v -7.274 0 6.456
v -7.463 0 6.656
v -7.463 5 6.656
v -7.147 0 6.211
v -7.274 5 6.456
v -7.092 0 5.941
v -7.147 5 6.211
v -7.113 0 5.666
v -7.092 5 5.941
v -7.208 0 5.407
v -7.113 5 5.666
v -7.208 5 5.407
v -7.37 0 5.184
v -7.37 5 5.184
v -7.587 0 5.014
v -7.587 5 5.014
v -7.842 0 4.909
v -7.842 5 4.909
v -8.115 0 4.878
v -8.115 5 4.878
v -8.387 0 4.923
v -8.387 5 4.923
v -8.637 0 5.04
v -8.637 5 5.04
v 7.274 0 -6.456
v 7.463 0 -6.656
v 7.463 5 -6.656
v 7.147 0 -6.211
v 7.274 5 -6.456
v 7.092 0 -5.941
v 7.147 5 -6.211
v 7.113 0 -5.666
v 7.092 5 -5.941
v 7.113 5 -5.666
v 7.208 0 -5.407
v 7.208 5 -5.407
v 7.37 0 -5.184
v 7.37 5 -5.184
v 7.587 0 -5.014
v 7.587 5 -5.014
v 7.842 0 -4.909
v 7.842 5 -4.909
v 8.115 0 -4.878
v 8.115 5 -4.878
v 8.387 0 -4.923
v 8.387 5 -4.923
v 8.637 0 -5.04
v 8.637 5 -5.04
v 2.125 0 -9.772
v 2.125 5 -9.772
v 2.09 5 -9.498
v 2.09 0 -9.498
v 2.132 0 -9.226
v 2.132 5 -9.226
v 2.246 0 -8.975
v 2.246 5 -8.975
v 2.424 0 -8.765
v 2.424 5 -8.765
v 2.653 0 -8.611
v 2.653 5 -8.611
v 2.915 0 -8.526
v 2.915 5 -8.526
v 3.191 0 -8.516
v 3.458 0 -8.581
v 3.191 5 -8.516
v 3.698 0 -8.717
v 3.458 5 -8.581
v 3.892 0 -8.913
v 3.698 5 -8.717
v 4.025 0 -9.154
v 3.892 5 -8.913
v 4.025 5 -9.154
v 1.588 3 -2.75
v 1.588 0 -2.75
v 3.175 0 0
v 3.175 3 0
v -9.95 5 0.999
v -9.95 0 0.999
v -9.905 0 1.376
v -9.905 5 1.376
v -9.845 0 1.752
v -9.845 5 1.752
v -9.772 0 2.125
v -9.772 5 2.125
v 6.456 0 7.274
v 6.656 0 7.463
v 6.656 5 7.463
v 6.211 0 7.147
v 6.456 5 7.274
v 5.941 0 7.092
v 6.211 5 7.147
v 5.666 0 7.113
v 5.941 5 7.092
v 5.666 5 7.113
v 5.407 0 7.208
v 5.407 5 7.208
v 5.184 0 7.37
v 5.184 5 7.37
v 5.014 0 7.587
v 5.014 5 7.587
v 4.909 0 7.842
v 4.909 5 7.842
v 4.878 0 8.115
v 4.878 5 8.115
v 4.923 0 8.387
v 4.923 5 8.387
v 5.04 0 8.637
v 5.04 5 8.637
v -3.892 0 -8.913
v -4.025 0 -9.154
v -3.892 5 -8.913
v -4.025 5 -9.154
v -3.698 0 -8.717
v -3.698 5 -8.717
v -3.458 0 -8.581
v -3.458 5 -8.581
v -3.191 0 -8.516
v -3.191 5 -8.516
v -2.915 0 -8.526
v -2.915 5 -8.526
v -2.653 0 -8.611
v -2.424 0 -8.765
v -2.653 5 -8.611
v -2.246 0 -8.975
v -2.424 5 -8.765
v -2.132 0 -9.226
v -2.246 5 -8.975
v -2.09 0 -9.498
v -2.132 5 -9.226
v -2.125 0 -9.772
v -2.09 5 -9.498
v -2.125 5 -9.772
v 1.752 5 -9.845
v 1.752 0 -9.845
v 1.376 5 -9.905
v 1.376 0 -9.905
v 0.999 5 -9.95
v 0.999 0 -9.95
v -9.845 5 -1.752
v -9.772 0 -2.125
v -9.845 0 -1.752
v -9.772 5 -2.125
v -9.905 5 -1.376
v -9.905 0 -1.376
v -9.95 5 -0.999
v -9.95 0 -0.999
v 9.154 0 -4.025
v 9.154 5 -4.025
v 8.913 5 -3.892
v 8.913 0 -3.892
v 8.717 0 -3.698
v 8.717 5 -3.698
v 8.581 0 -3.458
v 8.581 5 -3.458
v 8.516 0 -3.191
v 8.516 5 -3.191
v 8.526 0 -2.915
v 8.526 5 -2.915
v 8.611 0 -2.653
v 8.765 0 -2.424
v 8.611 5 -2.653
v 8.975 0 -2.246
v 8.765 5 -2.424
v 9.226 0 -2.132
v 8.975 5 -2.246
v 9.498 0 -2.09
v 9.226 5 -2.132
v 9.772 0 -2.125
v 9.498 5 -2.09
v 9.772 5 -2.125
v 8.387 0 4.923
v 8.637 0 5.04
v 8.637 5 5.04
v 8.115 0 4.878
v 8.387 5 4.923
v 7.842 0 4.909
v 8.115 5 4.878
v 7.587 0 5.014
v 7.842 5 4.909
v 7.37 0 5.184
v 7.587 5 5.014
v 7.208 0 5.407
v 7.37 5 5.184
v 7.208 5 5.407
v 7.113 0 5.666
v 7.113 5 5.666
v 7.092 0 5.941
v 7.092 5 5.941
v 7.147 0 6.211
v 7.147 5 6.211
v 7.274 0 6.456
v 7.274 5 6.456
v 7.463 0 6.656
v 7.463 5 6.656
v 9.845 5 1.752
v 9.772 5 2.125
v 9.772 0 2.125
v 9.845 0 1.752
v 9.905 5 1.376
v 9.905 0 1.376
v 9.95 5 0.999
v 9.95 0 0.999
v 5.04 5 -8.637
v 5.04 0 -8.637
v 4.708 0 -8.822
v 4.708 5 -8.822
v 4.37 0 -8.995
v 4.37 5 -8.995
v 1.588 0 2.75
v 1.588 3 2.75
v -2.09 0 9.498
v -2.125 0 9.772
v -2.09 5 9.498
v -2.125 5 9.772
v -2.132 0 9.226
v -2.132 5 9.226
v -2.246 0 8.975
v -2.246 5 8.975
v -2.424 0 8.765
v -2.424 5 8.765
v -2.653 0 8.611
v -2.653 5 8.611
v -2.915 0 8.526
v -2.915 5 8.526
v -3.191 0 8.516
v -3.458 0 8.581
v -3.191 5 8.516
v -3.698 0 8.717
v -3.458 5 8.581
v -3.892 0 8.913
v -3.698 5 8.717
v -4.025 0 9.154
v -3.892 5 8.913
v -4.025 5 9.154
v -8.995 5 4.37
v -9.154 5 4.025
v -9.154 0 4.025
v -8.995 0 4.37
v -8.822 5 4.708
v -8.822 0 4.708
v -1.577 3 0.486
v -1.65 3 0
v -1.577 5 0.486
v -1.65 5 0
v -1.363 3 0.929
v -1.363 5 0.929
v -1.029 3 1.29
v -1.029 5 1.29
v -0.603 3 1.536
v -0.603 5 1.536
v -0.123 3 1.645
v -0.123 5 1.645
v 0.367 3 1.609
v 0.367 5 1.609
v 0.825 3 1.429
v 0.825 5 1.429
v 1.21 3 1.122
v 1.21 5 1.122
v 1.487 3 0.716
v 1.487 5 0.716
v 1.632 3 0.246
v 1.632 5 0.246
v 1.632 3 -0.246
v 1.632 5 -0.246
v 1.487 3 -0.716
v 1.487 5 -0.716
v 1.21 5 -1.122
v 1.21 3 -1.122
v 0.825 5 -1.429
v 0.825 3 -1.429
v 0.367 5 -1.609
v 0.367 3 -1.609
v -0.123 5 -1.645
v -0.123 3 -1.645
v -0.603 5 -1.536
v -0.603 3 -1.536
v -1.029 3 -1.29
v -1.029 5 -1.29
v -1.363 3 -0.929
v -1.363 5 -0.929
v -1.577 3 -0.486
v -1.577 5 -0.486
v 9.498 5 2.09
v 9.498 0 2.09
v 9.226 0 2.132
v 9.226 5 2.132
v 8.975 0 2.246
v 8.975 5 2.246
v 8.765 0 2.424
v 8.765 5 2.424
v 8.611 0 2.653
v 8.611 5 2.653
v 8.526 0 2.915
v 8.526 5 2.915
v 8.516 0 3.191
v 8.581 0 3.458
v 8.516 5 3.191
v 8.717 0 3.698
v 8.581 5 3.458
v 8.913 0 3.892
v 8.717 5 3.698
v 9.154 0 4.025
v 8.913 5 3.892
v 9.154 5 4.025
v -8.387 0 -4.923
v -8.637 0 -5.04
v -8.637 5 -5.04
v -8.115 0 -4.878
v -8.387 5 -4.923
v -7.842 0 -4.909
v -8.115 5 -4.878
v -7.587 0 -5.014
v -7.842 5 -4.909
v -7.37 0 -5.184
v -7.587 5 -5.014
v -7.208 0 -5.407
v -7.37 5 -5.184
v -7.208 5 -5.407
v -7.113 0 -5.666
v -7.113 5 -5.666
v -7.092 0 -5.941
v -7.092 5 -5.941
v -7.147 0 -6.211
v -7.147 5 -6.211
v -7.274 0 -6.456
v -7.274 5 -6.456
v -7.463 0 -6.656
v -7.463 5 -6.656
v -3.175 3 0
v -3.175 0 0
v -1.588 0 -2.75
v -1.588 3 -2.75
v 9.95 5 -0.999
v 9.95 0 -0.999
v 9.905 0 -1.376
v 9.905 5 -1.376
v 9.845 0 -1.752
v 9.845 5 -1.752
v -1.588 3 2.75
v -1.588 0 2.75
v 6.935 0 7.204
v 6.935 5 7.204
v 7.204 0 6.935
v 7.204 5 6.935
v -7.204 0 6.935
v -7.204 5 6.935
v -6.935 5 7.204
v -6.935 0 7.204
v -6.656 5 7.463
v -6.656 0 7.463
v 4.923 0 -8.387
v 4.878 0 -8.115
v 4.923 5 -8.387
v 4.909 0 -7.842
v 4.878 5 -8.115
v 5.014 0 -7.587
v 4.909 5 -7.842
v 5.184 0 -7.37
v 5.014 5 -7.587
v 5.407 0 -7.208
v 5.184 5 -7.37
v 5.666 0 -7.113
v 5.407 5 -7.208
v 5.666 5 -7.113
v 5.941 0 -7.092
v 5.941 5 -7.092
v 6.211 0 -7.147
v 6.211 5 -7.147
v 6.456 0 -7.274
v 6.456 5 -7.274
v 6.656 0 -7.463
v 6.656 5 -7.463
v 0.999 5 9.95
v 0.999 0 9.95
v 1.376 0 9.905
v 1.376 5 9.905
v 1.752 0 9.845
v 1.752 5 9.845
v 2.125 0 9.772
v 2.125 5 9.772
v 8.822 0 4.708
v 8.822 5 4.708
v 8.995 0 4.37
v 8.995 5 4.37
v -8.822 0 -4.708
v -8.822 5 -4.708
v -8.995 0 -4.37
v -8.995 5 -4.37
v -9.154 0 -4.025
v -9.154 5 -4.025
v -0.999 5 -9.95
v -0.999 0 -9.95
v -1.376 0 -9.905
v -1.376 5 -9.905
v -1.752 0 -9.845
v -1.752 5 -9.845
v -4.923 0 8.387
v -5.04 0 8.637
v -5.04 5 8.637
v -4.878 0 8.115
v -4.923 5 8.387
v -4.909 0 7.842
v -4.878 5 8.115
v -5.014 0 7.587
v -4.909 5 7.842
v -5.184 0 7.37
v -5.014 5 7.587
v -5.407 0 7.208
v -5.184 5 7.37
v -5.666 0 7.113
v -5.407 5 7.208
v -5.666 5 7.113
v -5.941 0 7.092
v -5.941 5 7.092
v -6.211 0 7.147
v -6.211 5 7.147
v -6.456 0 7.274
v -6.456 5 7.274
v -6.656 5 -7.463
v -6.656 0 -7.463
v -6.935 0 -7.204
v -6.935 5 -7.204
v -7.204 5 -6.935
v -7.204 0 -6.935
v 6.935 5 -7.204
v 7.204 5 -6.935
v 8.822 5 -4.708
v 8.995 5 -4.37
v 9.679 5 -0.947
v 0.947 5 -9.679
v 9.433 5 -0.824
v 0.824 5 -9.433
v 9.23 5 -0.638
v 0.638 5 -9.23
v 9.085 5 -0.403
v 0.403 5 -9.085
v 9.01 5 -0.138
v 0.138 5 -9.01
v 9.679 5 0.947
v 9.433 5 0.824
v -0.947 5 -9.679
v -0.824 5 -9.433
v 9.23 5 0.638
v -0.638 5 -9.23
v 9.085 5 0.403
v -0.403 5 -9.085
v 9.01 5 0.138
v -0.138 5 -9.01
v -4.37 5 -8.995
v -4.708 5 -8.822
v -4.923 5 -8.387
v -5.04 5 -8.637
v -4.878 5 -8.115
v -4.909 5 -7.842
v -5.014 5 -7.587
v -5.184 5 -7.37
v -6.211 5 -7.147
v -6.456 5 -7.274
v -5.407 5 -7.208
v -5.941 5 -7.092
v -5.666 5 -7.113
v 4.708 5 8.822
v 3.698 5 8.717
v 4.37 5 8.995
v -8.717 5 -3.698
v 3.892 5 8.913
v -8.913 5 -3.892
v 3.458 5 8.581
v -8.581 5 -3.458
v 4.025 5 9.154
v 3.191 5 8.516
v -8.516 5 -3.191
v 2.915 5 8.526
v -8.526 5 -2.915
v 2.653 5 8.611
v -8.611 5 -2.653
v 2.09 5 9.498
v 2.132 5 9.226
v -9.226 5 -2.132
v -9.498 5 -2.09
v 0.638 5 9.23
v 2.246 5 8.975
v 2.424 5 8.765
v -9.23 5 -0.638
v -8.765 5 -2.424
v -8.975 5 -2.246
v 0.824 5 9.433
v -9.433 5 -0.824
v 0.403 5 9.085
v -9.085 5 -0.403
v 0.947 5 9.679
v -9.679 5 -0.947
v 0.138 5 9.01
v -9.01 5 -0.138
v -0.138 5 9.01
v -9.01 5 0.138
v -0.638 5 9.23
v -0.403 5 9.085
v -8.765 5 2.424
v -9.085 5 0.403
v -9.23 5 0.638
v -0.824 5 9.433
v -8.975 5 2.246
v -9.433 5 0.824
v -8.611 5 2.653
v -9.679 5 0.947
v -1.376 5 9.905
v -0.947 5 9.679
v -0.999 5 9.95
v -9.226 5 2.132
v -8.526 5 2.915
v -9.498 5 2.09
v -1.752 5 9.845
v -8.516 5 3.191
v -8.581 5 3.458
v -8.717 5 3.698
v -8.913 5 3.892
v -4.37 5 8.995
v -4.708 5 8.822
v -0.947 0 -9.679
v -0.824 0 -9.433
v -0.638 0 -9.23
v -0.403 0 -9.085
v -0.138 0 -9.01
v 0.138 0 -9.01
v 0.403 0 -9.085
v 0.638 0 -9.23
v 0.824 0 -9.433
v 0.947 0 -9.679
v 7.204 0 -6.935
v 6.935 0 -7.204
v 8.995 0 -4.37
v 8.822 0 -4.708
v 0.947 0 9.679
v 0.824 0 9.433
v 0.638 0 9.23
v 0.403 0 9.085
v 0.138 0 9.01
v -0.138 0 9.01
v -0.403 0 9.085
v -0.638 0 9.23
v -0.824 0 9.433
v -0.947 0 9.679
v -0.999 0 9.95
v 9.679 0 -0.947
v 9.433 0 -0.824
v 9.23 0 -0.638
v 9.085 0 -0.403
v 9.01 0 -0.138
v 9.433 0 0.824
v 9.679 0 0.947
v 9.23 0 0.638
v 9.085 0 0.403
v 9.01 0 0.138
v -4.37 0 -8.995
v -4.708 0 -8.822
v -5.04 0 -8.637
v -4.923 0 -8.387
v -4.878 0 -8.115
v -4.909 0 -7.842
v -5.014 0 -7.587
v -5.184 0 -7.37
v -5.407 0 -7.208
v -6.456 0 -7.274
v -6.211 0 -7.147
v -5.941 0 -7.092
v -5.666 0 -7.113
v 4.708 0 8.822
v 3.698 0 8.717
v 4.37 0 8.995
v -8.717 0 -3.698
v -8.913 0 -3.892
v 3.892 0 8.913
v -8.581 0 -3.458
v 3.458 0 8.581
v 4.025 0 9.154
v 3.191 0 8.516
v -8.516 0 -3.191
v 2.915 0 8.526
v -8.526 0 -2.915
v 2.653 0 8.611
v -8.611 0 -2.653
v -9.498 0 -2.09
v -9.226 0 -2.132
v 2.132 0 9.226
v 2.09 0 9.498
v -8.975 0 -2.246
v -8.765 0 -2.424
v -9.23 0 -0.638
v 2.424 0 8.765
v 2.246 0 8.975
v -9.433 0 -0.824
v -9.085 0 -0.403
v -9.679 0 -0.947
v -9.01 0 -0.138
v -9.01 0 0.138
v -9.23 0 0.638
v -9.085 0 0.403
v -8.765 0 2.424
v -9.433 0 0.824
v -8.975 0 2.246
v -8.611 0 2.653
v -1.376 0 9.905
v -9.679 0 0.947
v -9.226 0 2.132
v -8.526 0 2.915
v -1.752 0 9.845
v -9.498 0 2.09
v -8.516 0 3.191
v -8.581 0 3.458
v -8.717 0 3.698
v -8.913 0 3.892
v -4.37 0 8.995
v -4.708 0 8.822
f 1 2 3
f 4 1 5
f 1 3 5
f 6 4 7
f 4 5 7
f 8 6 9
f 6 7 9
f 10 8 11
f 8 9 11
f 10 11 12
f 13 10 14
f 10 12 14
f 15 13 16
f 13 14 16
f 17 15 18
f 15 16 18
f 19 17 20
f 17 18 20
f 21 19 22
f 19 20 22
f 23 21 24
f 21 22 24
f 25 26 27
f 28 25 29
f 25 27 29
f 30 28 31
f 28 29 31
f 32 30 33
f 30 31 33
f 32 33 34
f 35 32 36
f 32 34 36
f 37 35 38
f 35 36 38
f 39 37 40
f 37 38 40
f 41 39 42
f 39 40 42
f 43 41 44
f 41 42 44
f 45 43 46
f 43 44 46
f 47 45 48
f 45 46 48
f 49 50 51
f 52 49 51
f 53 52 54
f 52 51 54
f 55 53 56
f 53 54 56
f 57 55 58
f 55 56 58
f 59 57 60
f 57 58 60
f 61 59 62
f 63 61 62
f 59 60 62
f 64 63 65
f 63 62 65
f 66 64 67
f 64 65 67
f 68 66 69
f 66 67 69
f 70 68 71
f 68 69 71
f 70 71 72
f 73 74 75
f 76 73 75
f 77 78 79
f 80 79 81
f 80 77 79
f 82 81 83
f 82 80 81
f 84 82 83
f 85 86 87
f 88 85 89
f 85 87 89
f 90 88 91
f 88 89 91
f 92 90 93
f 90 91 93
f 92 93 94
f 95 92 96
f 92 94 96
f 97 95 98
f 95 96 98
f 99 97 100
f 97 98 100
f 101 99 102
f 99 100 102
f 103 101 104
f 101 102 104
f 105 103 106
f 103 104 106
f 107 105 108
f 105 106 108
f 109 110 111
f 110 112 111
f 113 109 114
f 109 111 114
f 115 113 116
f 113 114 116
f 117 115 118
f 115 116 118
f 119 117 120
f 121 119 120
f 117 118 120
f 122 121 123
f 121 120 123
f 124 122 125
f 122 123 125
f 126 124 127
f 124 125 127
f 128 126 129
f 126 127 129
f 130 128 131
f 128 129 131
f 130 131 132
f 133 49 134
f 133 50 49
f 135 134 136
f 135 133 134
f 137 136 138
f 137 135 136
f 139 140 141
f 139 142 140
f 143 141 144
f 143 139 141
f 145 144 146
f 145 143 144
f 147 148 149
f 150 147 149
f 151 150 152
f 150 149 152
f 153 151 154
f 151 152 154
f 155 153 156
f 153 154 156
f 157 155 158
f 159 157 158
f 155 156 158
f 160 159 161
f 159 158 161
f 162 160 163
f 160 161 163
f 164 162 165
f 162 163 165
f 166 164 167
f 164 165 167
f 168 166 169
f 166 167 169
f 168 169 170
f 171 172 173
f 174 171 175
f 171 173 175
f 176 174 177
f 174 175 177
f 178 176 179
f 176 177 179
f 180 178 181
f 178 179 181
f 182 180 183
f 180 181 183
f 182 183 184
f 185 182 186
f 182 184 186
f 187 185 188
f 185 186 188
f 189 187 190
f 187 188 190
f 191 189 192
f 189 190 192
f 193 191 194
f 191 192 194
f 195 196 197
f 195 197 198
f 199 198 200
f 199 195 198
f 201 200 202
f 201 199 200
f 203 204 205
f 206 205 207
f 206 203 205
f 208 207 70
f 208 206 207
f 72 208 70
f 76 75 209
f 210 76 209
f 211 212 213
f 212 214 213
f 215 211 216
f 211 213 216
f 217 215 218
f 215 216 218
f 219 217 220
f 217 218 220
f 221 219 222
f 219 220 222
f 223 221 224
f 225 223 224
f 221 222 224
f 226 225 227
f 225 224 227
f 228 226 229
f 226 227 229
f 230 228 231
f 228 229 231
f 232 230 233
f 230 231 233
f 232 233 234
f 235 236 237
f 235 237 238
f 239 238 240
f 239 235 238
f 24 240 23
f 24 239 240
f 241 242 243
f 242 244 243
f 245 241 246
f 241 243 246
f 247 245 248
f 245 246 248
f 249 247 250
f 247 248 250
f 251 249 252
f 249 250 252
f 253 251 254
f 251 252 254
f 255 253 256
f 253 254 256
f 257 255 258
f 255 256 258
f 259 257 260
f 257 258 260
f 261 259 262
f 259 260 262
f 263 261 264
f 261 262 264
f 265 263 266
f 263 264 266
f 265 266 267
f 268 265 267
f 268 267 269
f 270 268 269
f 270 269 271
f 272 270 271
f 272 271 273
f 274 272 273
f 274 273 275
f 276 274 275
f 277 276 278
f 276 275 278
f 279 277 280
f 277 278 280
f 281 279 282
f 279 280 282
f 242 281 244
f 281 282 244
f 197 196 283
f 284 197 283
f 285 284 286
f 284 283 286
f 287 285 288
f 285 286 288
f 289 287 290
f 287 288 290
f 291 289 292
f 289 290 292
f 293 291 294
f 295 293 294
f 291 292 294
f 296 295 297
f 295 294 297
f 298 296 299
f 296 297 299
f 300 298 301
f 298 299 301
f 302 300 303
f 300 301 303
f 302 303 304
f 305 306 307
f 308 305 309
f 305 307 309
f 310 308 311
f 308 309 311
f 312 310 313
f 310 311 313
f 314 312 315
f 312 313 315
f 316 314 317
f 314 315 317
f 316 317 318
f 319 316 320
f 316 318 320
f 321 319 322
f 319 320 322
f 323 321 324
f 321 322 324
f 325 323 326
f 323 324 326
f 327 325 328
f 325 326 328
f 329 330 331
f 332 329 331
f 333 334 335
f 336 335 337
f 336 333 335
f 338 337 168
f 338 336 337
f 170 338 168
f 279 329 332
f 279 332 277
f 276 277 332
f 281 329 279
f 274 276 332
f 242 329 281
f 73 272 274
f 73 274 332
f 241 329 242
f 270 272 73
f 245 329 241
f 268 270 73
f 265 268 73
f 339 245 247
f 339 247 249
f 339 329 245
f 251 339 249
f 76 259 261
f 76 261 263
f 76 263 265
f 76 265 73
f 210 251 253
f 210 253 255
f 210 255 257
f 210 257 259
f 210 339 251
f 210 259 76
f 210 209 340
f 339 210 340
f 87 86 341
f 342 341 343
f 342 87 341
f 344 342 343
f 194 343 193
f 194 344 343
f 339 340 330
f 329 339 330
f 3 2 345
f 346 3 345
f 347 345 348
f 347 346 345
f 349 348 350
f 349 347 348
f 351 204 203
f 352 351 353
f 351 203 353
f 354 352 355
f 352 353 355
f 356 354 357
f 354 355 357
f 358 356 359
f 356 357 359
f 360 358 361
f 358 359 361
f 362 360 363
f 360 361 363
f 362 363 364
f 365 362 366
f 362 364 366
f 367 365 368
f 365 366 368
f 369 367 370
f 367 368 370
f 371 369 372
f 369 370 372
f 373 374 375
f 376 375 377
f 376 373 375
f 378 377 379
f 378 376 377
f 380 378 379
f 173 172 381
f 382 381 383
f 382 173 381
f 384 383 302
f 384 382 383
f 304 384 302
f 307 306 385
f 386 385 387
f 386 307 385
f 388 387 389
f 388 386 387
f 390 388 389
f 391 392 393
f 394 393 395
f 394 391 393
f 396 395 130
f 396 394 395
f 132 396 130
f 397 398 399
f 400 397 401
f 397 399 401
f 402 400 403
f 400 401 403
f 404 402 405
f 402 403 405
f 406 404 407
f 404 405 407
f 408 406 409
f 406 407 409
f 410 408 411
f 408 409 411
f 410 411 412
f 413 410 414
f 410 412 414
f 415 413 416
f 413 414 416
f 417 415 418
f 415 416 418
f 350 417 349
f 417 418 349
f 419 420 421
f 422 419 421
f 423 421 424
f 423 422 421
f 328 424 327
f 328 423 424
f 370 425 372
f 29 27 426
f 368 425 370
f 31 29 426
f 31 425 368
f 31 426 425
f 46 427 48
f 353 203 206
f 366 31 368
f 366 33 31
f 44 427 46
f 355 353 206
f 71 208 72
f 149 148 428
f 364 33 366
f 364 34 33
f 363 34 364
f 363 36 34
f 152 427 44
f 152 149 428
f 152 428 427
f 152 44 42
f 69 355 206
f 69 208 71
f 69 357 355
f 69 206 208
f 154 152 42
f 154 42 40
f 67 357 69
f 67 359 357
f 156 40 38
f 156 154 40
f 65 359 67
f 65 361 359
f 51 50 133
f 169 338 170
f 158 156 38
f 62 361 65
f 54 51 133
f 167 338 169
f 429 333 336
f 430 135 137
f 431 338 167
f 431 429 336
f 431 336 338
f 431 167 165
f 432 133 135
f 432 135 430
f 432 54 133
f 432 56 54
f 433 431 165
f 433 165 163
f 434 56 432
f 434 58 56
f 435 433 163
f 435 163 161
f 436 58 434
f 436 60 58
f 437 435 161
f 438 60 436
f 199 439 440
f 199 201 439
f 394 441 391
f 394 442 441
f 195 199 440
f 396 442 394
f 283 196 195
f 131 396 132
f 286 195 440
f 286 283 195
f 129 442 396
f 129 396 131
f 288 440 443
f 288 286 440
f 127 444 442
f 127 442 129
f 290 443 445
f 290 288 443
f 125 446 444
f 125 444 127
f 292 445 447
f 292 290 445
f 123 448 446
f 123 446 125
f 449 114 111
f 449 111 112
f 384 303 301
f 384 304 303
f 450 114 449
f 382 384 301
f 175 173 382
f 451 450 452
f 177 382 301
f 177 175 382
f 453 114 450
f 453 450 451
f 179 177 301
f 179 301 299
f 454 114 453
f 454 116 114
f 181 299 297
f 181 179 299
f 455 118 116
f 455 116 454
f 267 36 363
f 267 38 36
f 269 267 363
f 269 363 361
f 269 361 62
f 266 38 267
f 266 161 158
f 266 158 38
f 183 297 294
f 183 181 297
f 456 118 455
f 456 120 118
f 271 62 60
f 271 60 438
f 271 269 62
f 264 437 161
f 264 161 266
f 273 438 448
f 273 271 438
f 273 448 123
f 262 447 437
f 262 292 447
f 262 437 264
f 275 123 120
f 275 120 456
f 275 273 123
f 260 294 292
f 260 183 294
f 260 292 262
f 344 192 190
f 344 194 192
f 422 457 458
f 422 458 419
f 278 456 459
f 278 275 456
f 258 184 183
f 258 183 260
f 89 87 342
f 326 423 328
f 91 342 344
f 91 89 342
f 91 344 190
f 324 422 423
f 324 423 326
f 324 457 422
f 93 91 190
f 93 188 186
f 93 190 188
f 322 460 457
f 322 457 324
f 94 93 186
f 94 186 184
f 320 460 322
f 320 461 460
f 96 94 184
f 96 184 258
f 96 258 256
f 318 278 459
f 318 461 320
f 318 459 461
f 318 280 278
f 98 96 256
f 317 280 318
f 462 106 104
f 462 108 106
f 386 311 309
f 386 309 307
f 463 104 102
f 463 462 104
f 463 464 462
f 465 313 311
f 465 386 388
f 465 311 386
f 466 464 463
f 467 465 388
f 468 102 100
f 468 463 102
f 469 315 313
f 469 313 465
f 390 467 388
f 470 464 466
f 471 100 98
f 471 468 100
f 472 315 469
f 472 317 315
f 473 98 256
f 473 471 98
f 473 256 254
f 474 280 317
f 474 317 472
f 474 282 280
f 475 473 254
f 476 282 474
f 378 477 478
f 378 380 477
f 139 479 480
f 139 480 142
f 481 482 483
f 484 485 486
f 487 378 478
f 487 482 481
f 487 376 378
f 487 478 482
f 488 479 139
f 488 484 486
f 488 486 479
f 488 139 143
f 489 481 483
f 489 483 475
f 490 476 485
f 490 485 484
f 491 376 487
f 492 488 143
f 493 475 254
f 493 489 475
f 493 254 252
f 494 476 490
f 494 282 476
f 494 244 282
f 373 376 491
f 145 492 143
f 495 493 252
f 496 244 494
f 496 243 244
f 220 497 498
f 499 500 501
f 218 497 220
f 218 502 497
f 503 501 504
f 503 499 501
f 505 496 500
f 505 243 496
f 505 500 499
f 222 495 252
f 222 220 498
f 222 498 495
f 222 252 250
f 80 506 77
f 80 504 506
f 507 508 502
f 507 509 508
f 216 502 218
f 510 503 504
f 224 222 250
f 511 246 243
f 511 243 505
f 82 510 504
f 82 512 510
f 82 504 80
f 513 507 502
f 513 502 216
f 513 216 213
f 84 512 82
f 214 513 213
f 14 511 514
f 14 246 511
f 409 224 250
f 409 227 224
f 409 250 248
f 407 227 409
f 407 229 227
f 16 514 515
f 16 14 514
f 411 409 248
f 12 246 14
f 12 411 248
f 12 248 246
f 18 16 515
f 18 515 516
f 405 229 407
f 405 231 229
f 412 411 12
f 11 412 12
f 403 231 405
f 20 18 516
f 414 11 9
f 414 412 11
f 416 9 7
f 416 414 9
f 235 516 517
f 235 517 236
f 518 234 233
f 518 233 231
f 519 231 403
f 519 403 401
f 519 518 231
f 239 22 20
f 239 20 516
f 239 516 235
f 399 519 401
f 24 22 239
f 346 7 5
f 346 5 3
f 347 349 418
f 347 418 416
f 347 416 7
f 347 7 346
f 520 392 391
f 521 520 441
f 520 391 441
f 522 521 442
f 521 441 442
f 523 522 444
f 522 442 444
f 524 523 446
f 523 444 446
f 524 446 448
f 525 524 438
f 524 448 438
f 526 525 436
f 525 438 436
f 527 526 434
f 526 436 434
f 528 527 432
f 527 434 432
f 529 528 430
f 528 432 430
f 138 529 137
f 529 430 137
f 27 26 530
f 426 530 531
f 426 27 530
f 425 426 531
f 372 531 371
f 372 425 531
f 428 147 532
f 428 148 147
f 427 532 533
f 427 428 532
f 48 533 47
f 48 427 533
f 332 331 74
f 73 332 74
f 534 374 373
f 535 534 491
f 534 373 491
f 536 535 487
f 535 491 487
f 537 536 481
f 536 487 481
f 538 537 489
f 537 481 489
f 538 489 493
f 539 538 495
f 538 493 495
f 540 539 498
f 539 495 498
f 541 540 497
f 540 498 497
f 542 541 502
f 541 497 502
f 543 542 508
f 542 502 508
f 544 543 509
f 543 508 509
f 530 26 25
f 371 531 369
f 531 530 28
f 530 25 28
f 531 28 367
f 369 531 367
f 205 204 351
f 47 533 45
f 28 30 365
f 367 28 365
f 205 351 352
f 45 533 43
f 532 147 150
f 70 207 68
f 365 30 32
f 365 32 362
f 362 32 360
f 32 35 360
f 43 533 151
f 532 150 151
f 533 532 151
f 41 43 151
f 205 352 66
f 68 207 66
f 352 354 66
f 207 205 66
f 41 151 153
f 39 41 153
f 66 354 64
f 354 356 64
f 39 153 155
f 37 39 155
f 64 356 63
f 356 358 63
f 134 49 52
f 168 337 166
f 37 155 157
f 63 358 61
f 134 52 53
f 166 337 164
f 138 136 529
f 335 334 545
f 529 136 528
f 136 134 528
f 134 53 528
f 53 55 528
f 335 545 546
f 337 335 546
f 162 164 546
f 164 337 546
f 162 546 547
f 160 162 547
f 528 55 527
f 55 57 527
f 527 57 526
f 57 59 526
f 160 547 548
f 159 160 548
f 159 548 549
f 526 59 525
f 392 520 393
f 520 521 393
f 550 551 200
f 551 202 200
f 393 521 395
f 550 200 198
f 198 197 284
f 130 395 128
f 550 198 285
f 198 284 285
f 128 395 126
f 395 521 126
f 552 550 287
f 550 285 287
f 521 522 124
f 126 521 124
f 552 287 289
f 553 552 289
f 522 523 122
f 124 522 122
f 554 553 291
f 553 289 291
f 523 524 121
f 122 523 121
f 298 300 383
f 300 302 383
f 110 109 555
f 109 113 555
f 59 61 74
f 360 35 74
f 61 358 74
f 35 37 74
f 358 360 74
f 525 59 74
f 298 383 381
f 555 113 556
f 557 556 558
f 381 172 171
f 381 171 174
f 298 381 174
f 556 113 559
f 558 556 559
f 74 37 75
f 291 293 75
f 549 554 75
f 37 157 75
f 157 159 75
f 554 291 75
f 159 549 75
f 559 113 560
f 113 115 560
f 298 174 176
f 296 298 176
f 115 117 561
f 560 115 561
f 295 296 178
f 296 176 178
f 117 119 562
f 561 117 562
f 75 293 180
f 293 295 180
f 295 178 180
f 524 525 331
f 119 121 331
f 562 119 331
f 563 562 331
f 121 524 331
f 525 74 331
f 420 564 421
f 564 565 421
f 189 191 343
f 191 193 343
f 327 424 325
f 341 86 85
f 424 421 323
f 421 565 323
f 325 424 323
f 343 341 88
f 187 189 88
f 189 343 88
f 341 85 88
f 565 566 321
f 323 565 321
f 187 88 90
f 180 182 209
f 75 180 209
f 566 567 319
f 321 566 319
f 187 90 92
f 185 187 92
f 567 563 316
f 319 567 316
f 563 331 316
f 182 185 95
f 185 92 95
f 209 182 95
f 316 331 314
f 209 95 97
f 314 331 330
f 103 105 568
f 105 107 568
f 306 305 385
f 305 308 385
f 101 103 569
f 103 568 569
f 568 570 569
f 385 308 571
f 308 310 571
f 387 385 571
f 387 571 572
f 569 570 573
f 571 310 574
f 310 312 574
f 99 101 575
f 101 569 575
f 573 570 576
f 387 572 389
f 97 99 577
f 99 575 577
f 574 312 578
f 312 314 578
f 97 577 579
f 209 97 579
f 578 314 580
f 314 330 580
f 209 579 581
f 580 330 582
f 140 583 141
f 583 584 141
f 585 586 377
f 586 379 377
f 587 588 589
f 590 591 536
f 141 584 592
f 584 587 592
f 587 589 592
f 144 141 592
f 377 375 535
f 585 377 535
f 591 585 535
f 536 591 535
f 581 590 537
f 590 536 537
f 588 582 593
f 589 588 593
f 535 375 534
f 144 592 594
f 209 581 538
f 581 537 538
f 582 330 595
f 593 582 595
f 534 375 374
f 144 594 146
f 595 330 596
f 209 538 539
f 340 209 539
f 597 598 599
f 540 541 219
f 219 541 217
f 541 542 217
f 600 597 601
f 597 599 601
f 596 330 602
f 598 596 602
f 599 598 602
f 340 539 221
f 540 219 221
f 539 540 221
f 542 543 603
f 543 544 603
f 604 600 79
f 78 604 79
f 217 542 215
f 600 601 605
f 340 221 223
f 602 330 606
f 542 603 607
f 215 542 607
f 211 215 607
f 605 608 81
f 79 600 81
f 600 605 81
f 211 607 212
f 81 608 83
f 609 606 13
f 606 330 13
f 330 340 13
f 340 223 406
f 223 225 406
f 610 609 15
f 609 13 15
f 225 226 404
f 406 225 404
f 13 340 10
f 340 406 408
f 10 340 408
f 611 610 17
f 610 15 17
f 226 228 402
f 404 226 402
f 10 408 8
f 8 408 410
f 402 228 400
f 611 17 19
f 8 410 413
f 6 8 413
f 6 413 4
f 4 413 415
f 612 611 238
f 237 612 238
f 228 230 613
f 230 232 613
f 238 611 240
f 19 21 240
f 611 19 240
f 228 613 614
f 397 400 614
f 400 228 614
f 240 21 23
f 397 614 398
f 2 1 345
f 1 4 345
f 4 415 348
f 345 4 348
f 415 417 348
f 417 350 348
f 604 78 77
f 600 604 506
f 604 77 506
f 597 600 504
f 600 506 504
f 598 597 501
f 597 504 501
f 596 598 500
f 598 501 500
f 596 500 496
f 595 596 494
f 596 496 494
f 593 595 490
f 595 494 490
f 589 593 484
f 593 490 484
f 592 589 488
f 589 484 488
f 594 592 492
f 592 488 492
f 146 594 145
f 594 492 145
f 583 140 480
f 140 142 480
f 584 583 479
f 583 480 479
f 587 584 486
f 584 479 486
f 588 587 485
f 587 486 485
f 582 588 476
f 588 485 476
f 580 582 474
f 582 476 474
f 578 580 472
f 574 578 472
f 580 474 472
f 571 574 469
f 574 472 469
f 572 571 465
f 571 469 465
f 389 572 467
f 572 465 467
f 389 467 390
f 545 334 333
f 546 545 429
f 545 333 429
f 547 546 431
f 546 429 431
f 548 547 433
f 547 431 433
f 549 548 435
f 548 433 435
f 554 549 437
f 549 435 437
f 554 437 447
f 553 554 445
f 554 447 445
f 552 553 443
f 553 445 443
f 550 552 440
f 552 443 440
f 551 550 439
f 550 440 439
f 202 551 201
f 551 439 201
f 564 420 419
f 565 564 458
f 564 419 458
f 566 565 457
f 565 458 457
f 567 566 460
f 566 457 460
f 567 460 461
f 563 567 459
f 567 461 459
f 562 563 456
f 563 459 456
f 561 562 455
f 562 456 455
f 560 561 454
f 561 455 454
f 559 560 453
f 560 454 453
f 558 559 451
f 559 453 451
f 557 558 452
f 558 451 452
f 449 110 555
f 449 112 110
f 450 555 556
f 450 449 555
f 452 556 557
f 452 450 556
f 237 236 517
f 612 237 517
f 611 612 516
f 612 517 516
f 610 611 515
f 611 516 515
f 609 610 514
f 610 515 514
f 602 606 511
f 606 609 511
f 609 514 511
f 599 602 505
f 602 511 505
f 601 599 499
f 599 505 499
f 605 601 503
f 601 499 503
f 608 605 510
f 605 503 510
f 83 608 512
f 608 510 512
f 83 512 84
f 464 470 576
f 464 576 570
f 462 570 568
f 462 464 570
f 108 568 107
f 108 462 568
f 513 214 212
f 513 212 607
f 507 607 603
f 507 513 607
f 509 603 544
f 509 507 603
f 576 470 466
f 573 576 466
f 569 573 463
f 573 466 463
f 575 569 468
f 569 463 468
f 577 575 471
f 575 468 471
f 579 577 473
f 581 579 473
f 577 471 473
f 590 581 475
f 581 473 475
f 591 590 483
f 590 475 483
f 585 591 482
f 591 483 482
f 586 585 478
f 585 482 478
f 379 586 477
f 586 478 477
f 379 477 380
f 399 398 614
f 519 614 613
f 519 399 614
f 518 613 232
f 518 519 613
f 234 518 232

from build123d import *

# Parameters (mm, degrees)
ESBO_O1_W             = 8.35
ESBO_O1_H             = 5
CORTE_EXTRUS_O1_DEPTH = 3
ESBO_O4_R             = 1
CORTE_EXTRUS_O2_DEPTH = 10


with BuildPart() as part:
    # Esboço1 → Revolução1 (revolve)
    with BuildSketch(Plane.XY):
        with Locations((-5.825, 2.5)):
            Rectangle(ESBO_O1_W, ESBO_O1_H)
    revolve(axis=Axis((0, 0, 0), (0, 1, 0)))

    # Esboço3 → Corte-extrusão1 (cut)
    with BuildSketch(Plane.XZ):
        Polygon((3.175426481, 0), (1.58771324, 2.75), (-1.58771324, 2.75), (-3.175426481, 0), (-1.58771324, -2.75), (1.58771324, -2.75), align=None)
    extrude(amount=-CORTE_EXTRUS_O1_DEPTH, mode=Mode.SUBTRACT)

    # Esboço4 → Corte-extrusão2 (cut)
    with BuildSketch(Plane(origin=(0, 5, 0), x_dir=(1, 0, 0), z_dir=(0, 1, 0))):
        with Locations((0, 10)):
            Circle(ESBO_O4_R)
        with Locations((3.090169944, 9.510565163)):
            Circle(ESBO_O4_R)
        with Locations((5.877852523, 8.090169944)):
            Circle(ESBO_O4_R)
        with Locations((8.090169944, 5.877852523)):
            Circle(ESBO_O4_R)
        with Locations((9.510565163, 3.090169944)):
            Circle(ESBO_O4_R)
        with Locations((10, 0)):
            Circle(ESBO_O4_R)
        with Locations((9.510565163, -3.090169944)):
            Circle(ESBO_O4_R)
        with Locations((8.090169944, -5.877852523)):
            Circle(ESBO_O4_R)
        with Locations((5.877852523, -8.090169944)):
            Circle(ESBO_O4_R)
        with Locations((3.090169944, -9.510565163)):
            Circle(ESBO_O4_R)
        with Locations((0, -10)):
            Circle(ESBO_O4_R)
        with Locations((-3.090169944, -9.510565163)):
            Circle(ESBO_O4_R)
        with Locations((-5.877852523, -8.090169944)):
            Circle(ESBO_O4_R)
        with Locations((-8.090169944, -5.877852523)):
            Circle(ESBO_O4_R)
        with Locations((-9.510565163, -3.090169944)):
            Circle(ESBO_O4_R)
        with Locations((-10, 0)):
            Circle(ESBO_O4_R)
        with Locations((-9.510565163, 3.090169944)):
            Circle(ESBO_O4_R)
        with Locations((-8.090169944, 5.877852523)):
            Circle(ESBO_O4_R)
        with Locations((-5.877852523, 8.090169944)):
            Circle(ESBO_O4_R)
        with Locations((-3.090169944, 9.510565163)):
            Circle(ESBO_O4_R)
    extrude(amount=-CORTE_EXTRUS_O2_DEPTH, mode=Mode.SUBTRACT)


solid = part.part
